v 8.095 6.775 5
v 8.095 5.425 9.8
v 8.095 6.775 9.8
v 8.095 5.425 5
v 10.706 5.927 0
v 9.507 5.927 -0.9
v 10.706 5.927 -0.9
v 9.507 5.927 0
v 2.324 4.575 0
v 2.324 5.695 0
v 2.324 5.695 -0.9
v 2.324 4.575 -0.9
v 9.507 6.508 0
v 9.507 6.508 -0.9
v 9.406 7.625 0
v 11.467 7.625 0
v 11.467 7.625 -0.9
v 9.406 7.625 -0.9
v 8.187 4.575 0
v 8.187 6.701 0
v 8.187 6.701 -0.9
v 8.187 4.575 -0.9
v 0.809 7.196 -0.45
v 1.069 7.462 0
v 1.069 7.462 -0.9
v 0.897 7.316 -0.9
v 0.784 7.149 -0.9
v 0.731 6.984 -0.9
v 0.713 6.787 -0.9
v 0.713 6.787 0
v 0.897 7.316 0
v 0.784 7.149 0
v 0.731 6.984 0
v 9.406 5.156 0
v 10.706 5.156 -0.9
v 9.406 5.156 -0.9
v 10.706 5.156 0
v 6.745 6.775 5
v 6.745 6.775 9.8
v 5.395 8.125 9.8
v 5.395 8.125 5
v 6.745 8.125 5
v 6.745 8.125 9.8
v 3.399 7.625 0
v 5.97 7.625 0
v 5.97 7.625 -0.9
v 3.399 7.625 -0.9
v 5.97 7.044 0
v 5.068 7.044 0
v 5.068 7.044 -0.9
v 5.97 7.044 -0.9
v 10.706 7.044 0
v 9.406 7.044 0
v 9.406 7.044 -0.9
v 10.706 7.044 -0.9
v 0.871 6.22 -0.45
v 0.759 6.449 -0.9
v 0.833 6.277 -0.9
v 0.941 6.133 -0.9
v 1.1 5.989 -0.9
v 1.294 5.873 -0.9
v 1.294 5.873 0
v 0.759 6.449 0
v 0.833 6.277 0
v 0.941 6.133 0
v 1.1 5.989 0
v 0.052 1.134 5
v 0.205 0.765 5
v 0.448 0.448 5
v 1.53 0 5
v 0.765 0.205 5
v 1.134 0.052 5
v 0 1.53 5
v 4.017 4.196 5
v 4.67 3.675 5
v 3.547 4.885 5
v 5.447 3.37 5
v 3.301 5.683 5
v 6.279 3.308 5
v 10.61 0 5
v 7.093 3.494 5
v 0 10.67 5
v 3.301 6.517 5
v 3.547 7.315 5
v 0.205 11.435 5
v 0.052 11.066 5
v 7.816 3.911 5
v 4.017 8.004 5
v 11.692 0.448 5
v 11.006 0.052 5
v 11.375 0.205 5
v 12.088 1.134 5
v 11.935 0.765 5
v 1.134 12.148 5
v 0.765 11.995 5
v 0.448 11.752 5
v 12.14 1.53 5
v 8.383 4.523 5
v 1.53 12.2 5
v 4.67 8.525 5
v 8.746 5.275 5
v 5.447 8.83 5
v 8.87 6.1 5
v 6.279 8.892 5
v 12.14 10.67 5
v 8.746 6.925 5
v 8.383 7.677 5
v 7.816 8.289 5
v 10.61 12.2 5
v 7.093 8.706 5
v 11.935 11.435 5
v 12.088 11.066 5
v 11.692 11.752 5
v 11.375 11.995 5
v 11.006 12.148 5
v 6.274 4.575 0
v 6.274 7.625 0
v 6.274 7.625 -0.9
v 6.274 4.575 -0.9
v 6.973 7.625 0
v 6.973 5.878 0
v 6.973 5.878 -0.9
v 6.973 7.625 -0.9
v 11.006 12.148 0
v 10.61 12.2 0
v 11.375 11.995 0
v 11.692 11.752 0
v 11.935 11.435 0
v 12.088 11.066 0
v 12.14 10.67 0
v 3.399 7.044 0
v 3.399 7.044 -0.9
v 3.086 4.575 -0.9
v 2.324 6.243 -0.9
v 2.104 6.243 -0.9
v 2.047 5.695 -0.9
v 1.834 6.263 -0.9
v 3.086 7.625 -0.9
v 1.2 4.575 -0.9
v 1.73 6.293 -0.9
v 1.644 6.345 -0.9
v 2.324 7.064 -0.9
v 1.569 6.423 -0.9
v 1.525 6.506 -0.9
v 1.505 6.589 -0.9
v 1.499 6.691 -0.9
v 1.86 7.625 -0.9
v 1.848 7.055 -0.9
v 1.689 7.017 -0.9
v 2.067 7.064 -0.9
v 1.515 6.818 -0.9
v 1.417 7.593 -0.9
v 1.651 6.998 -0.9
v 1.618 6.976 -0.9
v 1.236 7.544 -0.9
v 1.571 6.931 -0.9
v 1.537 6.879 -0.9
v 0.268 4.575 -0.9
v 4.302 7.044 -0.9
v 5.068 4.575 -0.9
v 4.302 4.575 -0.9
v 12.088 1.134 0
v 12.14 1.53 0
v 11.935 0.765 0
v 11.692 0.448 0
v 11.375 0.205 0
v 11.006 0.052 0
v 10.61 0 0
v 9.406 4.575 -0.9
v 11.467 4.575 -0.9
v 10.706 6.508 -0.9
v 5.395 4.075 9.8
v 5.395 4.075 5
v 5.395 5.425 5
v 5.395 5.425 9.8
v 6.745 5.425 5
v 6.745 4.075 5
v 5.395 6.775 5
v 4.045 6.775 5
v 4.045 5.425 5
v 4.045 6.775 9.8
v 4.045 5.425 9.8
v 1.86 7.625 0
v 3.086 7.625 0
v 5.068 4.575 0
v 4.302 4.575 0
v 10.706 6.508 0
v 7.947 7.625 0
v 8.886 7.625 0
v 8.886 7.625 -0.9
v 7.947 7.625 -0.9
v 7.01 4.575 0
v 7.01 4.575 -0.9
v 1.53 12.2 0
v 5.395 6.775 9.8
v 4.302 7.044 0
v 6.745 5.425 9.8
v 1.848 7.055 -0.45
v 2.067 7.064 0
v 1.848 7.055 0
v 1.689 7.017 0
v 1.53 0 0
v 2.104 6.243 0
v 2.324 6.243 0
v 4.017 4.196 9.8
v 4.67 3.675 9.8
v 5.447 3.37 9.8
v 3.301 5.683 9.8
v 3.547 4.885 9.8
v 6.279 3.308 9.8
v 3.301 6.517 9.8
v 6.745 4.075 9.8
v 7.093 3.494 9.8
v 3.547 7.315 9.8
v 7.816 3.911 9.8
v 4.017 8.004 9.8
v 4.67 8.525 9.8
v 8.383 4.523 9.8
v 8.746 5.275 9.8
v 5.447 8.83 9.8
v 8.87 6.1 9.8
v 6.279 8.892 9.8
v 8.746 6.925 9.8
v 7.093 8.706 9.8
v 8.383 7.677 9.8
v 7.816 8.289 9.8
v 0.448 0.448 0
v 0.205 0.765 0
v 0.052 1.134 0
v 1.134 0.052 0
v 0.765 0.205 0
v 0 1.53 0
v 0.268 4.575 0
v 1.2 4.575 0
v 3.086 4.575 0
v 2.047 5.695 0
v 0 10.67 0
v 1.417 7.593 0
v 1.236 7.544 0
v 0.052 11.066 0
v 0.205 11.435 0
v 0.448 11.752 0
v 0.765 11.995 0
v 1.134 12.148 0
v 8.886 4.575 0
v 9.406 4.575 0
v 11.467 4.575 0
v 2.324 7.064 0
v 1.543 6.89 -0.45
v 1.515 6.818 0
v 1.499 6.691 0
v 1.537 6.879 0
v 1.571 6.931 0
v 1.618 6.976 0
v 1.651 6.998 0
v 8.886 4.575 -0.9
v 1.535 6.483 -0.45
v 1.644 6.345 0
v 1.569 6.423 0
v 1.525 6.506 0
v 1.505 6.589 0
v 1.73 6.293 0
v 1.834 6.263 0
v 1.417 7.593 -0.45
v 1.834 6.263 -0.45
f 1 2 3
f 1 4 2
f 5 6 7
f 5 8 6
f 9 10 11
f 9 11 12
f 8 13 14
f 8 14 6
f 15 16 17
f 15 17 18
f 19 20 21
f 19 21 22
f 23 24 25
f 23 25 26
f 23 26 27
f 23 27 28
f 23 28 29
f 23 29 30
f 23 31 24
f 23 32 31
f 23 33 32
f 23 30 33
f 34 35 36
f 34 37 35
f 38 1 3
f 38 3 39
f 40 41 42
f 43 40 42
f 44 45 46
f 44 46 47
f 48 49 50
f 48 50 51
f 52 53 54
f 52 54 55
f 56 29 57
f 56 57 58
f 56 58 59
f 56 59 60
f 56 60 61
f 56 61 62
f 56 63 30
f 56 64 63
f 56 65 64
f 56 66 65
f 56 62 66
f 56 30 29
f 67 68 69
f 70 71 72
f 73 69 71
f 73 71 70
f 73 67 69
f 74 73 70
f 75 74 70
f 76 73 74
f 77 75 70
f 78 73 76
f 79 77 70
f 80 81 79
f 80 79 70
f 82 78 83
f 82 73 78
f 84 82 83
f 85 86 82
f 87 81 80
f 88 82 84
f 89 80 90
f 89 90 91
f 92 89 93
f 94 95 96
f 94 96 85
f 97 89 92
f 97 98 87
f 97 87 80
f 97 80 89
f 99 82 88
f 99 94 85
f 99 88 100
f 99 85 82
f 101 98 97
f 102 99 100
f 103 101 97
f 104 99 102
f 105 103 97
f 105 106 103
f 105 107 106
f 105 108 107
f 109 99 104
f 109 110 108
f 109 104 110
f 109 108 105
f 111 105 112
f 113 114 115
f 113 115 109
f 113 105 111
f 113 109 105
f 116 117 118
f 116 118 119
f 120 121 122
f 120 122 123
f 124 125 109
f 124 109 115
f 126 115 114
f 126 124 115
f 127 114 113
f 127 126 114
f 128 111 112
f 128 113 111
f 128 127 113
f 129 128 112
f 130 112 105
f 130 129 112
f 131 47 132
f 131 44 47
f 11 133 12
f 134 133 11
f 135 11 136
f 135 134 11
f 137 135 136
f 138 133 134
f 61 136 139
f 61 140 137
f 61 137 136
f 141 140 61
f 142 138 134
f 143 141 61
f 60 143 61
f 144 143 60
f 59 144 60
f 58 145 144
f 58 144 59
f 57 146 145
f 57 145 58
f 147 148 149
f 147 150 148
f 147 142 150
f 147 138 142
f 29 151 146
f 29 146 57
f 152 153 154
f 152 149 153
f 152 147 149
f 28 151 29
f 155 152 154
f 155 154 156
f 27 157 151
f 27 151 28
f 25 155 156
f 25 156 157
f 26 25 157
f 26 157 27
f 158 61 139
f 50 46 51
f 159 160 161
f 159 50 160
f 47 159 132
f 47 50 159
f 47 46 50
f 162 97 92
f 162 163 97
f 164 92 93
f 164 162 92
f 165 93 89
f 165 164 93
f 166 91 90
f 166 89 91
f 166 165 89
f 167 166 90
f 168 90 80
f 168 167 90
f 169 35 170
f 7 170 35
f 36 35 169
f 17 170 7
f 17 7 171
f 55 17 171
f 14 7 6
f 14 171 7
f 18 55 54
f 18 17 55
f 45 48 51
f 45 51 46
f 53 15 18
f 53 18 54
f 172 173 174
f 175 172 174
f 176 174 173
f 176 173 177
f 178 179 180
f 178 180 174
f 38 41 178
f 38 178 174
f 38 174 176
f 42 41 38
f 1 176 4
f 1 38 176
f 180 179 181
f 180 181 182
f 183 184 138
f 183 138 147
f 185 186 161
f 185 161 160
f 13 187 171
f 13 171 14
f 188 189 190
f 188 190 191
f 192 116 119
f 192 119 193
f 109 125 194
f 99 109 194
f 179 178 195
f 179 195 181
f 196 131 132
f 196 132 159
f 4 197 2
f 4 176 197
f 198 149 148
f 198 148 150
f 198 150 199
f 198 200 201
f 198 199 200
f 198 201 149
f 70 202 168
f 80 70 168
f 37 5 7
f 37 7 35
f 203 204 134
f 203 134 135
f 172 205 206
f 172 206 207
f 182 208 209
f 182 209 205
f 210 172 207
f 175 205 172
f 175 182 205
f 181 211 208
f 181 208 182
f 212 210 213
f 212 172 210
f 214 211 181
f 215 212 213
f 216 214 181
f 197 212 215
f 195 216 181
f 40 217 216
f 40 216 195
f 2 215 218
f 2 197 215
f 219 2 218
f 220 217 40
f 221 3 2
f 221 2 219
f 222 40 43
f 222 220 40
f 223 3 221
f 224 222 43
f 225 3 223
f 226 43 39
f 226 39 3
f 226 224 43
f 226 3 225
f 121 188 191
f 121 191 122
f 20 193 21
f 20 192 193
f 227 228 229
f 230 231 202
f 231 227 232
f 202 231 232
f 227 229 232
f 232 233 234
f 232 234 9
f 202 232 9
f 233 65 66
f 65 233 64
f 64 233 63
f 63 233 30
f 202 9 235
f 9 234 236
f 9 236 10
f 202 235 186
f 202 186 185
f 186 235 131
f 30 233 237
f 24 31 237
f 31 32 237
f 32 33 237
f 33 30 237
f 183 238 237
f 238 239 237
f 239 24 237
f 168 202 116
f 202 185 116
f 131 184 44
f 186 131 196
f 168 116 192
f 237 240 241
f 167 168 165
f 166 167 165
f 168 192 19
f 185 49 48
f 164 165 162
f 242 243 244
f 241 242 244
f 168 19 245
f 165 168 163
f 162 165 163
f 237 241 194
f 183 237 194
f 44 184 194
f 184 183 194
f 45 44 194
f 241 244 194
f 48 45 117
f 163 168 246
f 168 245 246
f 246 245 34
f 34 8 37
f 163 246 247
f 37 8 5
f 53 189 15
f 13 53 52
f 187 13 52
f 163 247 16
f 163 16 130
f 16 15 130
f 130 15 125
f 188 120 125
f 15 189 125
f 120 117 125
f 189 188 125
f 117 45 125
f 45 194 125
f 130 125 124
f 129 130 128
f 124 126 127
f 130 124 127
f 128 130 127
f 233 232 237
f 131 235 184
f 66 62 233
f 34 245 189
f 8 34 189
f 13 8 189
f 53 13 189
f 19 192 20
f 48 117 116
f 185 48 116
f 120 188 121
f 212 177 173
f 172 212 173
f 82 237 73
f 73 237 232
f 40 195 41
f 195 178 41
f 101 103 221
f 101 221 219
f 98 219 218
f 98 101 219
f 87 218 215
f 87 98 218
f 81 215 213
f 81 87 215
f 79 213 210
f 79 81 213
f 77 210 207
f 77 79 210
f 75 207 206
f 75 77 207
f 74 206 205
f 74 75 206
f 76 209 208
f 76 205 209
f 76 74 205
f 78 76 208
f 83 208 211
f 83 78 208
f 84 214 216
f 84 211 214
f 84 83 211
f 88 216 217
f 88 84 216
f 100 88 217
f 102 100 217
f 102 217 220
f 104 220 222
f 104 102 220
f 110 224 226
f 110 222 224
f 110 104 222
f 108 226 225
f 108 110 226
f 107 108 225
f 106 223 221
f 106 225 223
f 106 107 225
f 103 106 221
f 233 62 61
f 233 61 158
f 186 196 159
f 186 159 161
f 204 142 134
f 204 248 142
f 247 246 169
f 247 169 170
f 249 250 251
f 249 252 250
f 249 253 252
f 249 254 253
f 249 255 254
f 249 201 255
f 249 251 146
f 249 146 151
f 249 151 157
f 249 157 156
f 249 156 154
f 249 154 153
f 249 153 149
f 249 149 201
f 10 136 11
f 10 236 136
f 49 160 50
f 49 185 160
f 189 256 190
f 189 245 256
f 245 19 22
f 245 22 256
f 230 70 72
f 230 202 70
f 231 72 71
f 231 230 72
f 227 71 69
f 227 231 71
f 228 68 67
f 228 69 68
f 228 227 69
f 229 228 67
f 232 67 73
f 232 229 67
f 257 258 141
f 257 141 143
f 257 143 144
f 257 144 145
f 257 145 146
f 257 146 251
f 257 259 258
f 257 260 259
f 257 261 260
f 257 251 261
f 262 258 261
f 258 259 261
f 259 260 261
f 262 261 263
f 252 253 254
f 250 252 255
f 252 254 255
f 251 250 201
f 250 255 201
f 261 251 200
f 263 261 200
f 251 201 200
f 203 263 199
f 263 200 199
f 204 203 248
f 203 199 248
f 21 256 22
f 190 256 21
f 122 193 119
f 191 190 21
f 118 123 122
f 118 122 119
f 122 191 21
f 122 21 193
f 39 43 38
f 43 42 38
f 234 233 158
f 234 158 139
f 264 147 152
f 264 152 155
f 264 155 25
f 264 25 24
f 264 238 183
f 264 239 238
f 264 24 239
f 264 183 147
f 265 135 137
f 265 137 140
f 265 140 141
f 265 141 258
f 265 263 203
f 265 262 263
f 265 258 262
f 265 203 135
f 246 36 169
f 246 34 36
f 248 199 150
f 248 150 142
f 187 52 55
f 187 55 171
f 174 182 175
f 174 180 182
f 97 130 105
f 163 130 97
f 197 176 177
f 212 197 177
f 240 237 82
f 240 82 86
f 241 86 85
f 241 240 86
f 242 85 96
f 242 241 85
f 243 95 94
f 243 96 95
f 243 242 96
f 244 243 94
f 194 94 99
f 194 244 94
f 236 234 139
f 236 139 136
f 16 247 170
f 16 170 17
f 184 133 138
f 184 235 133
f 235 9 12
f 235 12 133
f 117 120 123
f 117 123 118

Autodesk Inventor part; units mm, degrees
ref_plane "YZ Plane" through (0, 0, 0) normal (1, 0, 0) x (0, 1, 0)
ref_plane "XZ Plane" through (0, 0, 0) normal (0, 1, 0) x (-1, 0, 0)
sketch "Sketch1" plane through (0, 0, 0) normal (0, 0, 1) x (1, 0, 0)
  line L0 (14.6962, 12.74) -> (14.6962, 0) construction
  line L1 (10.61, 12.2) -> (1.53, 12.2)
  arc A0 (1.53, 12.2) -> (0, 10.67) centre (1.53, 10.67) ccw
  line L2 (0, 10.67) -> (0, 1.53)
  arc A1 (0, 1.53) -> (1.53, 0) centre (1.53, 1.53) ccw
  line L3 (1.53, 0) -> (10.61, 0)
  arc A2 (10.61, 0) -> (12.14, 1.53) centre (10.61, 1.53) ccw
  arc A3 (12.14, 10.67) -> (10.61, 12.2) centre (10.61, 10.67) ccw
  line L4 (12.14, 10.67) -> (12.14, 1.53)
  point P0 (0, 0)
  point P1 (0, 0)
  dimension "d10" = 12.74
ref_plane "Work Plane1" through (0, 0, 5) normal (0, 0, 1) x (1, 0, 0)
sketch "Sketch2" plane through (0, 0, 5) normal (0, 0, 1) x (1, 0, 0)
  line L0 (10.88, 12.74) -> (1.8, 12.74) projected
  line L1 (10.88, 12.74) -> (1.8, 12.74) projected
  arc A0 (1.8, 12.74) -> (0, 10.94) centre (1.8, 10.94) ccw projected
  line L2 (0, 10.94) -> (0, 1.8) projected
  arc A1 (0, 1.8) -> (1.8, 0) centre (1.8, 1.8) ccw projected
  line L3 (1.8, 0) -> (10.88, 0) projected
  arc A2 (10.88, 0) -> (12.68, 1.8) centre (10.88, 1.8) ccw projected
  line L4 (12.68, 1.8) -> (12.68, 10.94) projected
  arc A3 (12.68, 10.94) -> (10.88, 12.74) centre (10.88, 10.94) ccw projected
  circle A4 centre (6.34, 6.37) radius 2.8
  line L5 (5.665, 8.395) -> (7.015, 8.395)
  line L6 (7.015, 4.345) -> (5.665, 4.345)
  line L7 (5.665, 4.345) -> (7.015, 8.395) construction
  line L8 (5.665, 8.395) -> (7.015, 4.345) construction
  line L9 (8.365, 5.695) -> (8.365, 7.045)
  line L10 (4.315, 7.045) -> (4.315, 5.695)
  line L11 (4.315, 5.695) -> (8.365, 7.045) construction
  line L12 (8.365, 5.695) -> (4.315, 7.045) construction
  line L13 (4.315, 5.695) -> (5.665, 5.695)
  line L14 (7.015, 5.695) -> (8.365, 5.695)
  line L15 (5.665, 4.345) -> (5.665, 5.695)
  line L16 (5.665, 7.045) -> (5.665, 8.395)
  line L17 (8.365, 7.045) -> (7.015, 7.045)
  line L18 (5.665, 7.045) -> (4.315, 7.045)
  line L19 (7.015, 8.395) -> (7.015, 7.045)
  line L20 (7.015, 5.695) -> (7.015, 4.345)
  point P0 (0, 0)
  dimension "d3" = 5.6
  dimension "d4" = 4.05
  dimension "d5" = 1.35
  dimension "d6" = 4.05
  dimension "d7" = 1.35
extrude "Extrusion3" add sketch "Sketch1" along normal blind 5
sketch "Sketch3" plane through (0, 0, 5) normal (0, 0, 1) x (1, 0, 0)
  line L0 (10.61, 12.47) -> (1.53, 12.47)
  line L1 (10.61, 12.47) -> (1.53, 12.47)
  arc A0 (1.53, 12.47) -> (-0.27, 10.67) centre (1.53, 10.67) ccw
  line L2 (-0.27, 10.67) -> (-0.27, 1.53)
  arc A1 (-0.27, 1.53) -> (1.53, -0.27) centre (1.53, 1.53) ccw
  line L3 (1.53, -0.27) -> (10.61, -0.27)
  arc A2 (10.61, -0.27) -> (12.41, 1.53) centre (10.61, 1.53) ccw
  line L4 (12.41, 1.53) -> (12.41, 10.67)
  arc A3 (12.41, 10.67) -> (10.61, 12.47) centre (10.61, 10.67) ccw
  circle A4 centre (6.07, 6.1) radius 2.8
  line L5 (5.395, 8.125) -> (6.745, 8.125)
  line L6 (6.745, 4.075) -> (5.395, 4.075)
  line L7 (5.395, 4.075) -> (6.745, 8.125) construction
  line L8 (5.395, 8.125) -> (6.745, 4.075) construction
  line L9 (8.095, 5.425) -> (8.095, 6.775)
  line L10 (4.045, 6.775) -> (4.045, 5.425)
  line L11 (4.045, 5.425) -> (8.095, 6.775) construction
  line L12 (8.095, 5.425) -> (4.045, 6.775) construction
  line L13 (4.045, 5.425) -> (5.395, 5.425)
  line L14 (6.745, 5.425) -> (8.095, 5.425)
  line L15 (5.395, 4.075) -> (5.395, 5.425)
  line L16 (5.395, 6.775) -> (5.395, 8.125)
  line L17 (8.095, 6.775) -> (6.745, 6.775)
  line L18 (5.395, 6.775) -> (4.045, 6.775)
  line L19 (6.745, 8.125) -> (6.745, 6.775)
  line L20 (6.745, 5.425) -> (6.745, 4.075)
  line L21 (10.61, 12.2) -> (1.53, 12.2) projected
  line L22 (0, 10.67) -> (0, 1.53) projected
  point P0 (0, 0)
  point P1 (-0.27, -0.27)
  point P2 (6.07, 12.2)
  point P3 (0, 6.1)
  point P4 (6.07, 6.1)
  dimension "d14" = 5.6
  dimension "d15" = 4.05
  dimension "d16" = 1.35
  dimension "d17" = 4.05
  dimension "d18" = 1.35
extrude "Extrusion4" add sketch "Sketch3" along normal blind 4.8 contours A4
sketch "Sketch4" plane through (0, 0, 0) normal (0, 0, -1) x (-1, 0, 0)
  line L0 (-13.9436, 0) -> (-13.9436, 2.266)
  line L1 (-15.5559, 0) -> (-15.5559, 6.84)
  line L2 (-1.53, 0) -> (-10.61, 0) projected
  line L3 (-11.7832, 7.625) -> (-0.3568, 7.625) construction
  line L4 (-0.3568, 7.625) -> (-0.3568, 4.575) construction
  line L5 (-0.3568, 4.575) -> (-11.7832, 4.575) construction
  line L6 (-11.7832, 4.575) -> (-11.7832, 7.625) construction
  line L7 (-11.4668, 4.575) -> (-11.4668, 7.625)
  line L8 (-11.4668, 7.625) -> (-9.4055, 7.625)
  line L9 (-9.4055, 7.625) -> (-9.4055, 7.0442)
  line L10 (-9.4055, 7.0442) -> (-10.7056, 7.0442)
  line L11 (-10.7056, 7.0442) -> (-10.7056, 6.5078)
  line L12 (-10.7056, 6.5078) -> (-9.5068, 6.5078)
  line L13 (-9.5068, 6.5078) -> (-9.5068, 5.927)
  line L14 (-9.5068, 5.927) -> (-10.7056, 5.927)
  line L15 (-10.7056, 5.927) -> (-10.7056, 5.1558)
  line L16 (-10.7056, 5.1558) -> (-9.4055, 5.1558)
  line L17 (-9.4055, 5.1558) -> (-9.4055, 4.575)
  line L18 (-9.4055, 4.575) -> (-11.4668, 4.575)
  line L19 (-6.2739, 4.575) -> (-7.0105, 4.575)
  line L20 (-7.0105, 4.575) -> (-8.187, 6.7006)
  line L21 (-8.187, 6.7006) -> (-8.187, 4.575)
  line L22 (-8.187, 4.575) -> (-8.8864, 4.575)
  line L23 (-8.8864, 4.575) -> (-8.8864, 7.625)
  line L24 (-8.8864, 7.625) -> (-7.9472, 7.625)
  line L25 (-7.9472, 7.625) -> (-6.9734, 5.8776)
  line L26 (-6.9734, 5.8776) -> (-6.9734, 7.625)
  line L27 (-6.9734, 7.625) -> (-6.2739, 7.625)
  line L28 (-6.2739, 7.625) -> (-6.2739, 4.575)
  line L29 (-5.0678, 4.575) -> (-5.0678, 7.0442)
  line L30 (-5.0678, 7.0442) -> (-5.9699, 7.0442)
  line L31 (-5.9699, 7.0442) -> (-5.9699, 7.625)
  line L32 (-5.9699, 7.625) -> (-3.3994, 7.625)
  line L33 (-3.3994, 7.625) -> (-3.3994, 7.0442)
  line L34 (-3.3994, 7.0442) -> (-4.3015, 7.0442)
  line L35 (-4.3015, 7.0442) -> (-4.3015, 4.575)
  line L36 (-4.3015, 4.575) -> (-5.0678, 4.575)
  line L37 (-0.2678, 4.575) -> (-1.1996, 4.575)
  line L38 (-1.1996, 4.575) -> (-2.0474, 5.6947)
  line L39 (-2.0474, 5.6947) -> (-2.3242, 5.6947)
  line L40 (-2.3242, 5.6947) -> (-2.3242, 4.575)
  line L41 (-2.3242, 4.575) -> (-3.0855, 4.575)
  line L42 (-3.0855, 4.575) -> (-3.0855, 7.625)
  line L43 (-3.0855, 7.625) -> (-1.8596, 7.625)
  spline S0 degree 2 poles (-1.8596, 7.625) (-1.605, 7.625) (-1.2293, 7.5607) (-1.0686, 7.4619) knots 0 0 0 1 2 2 2
  spline S1 degree 2 poles (-1.0686, 7.4619) (-0.9055, 7.3581) (-0.7127, 7.0343) (-0.7127, 6.7871) knots 0 0 0 1 2 2 2
  spline S2 degree 2 poles (-0.7127, 6.7871) (-0.7127, 6.4386) (-1.0291, 6.0011) (-1.2936, 5.8726) knots 0 0 0 1 2 2 2
  line L44 (-1.2936, 5.8726) -> (-0.2678, 4.575)
  spline S3 degree 2 poles (-1.4987, 6.6907) (-1.4987, 6.8069) (-1.5877, 6.9725) (-1.689, 7.017) knots 0 0 0 1 2 2 2
  spline S4 degree 2 poles (-1.689, 7.017) (-1.7607, 7.0466) (-1.9362, 7.0639) (-2.0672, 7.0639) knots 0 0 0 1 2 2 2
  line L45 (-2.0672, 7.0639) -> (-2.3242, 7.0639)
  line L46 (-2.3242, 7.0639) -> (-2.3242, 6.2434)
  line L47 (-2.3242, 6.2434) -> (-2.1043, 6.2434)
  spline S5 degree 2 poles (-2.1043, 6.2434) (-1.9461, 6.2434) (-1.7212, 6.2829) (-1.6445, 6.3447) knots 0 0 0 1 2 2 2
  spline S6 degree 2 poles (-1.6445, 6.3447) (-1.5704, 6.404) (-1.4987, 6.5622) (-1.4987, 6.6907) knots 0 0 0 1 2 2 2
  point P0 (0, 0)
  point P1 (-6.07, 0)
  point P2 (-6.07, 2.266)
  point P3 (-6.07, 6.84)
  point P4 (-6.07, 6.1)
  point P5 (-6.07, 4.575)
  point P6 (-0.3568, 6.1)
  point P7 (-6.07, 6.1)
  dimension "d21" = 2.266
  dimension "d22" = 6.84
extrude "Extrusion5" add sketch "Sketch4" along normal blind 0.9
properties part number "IPC ENTR key"
